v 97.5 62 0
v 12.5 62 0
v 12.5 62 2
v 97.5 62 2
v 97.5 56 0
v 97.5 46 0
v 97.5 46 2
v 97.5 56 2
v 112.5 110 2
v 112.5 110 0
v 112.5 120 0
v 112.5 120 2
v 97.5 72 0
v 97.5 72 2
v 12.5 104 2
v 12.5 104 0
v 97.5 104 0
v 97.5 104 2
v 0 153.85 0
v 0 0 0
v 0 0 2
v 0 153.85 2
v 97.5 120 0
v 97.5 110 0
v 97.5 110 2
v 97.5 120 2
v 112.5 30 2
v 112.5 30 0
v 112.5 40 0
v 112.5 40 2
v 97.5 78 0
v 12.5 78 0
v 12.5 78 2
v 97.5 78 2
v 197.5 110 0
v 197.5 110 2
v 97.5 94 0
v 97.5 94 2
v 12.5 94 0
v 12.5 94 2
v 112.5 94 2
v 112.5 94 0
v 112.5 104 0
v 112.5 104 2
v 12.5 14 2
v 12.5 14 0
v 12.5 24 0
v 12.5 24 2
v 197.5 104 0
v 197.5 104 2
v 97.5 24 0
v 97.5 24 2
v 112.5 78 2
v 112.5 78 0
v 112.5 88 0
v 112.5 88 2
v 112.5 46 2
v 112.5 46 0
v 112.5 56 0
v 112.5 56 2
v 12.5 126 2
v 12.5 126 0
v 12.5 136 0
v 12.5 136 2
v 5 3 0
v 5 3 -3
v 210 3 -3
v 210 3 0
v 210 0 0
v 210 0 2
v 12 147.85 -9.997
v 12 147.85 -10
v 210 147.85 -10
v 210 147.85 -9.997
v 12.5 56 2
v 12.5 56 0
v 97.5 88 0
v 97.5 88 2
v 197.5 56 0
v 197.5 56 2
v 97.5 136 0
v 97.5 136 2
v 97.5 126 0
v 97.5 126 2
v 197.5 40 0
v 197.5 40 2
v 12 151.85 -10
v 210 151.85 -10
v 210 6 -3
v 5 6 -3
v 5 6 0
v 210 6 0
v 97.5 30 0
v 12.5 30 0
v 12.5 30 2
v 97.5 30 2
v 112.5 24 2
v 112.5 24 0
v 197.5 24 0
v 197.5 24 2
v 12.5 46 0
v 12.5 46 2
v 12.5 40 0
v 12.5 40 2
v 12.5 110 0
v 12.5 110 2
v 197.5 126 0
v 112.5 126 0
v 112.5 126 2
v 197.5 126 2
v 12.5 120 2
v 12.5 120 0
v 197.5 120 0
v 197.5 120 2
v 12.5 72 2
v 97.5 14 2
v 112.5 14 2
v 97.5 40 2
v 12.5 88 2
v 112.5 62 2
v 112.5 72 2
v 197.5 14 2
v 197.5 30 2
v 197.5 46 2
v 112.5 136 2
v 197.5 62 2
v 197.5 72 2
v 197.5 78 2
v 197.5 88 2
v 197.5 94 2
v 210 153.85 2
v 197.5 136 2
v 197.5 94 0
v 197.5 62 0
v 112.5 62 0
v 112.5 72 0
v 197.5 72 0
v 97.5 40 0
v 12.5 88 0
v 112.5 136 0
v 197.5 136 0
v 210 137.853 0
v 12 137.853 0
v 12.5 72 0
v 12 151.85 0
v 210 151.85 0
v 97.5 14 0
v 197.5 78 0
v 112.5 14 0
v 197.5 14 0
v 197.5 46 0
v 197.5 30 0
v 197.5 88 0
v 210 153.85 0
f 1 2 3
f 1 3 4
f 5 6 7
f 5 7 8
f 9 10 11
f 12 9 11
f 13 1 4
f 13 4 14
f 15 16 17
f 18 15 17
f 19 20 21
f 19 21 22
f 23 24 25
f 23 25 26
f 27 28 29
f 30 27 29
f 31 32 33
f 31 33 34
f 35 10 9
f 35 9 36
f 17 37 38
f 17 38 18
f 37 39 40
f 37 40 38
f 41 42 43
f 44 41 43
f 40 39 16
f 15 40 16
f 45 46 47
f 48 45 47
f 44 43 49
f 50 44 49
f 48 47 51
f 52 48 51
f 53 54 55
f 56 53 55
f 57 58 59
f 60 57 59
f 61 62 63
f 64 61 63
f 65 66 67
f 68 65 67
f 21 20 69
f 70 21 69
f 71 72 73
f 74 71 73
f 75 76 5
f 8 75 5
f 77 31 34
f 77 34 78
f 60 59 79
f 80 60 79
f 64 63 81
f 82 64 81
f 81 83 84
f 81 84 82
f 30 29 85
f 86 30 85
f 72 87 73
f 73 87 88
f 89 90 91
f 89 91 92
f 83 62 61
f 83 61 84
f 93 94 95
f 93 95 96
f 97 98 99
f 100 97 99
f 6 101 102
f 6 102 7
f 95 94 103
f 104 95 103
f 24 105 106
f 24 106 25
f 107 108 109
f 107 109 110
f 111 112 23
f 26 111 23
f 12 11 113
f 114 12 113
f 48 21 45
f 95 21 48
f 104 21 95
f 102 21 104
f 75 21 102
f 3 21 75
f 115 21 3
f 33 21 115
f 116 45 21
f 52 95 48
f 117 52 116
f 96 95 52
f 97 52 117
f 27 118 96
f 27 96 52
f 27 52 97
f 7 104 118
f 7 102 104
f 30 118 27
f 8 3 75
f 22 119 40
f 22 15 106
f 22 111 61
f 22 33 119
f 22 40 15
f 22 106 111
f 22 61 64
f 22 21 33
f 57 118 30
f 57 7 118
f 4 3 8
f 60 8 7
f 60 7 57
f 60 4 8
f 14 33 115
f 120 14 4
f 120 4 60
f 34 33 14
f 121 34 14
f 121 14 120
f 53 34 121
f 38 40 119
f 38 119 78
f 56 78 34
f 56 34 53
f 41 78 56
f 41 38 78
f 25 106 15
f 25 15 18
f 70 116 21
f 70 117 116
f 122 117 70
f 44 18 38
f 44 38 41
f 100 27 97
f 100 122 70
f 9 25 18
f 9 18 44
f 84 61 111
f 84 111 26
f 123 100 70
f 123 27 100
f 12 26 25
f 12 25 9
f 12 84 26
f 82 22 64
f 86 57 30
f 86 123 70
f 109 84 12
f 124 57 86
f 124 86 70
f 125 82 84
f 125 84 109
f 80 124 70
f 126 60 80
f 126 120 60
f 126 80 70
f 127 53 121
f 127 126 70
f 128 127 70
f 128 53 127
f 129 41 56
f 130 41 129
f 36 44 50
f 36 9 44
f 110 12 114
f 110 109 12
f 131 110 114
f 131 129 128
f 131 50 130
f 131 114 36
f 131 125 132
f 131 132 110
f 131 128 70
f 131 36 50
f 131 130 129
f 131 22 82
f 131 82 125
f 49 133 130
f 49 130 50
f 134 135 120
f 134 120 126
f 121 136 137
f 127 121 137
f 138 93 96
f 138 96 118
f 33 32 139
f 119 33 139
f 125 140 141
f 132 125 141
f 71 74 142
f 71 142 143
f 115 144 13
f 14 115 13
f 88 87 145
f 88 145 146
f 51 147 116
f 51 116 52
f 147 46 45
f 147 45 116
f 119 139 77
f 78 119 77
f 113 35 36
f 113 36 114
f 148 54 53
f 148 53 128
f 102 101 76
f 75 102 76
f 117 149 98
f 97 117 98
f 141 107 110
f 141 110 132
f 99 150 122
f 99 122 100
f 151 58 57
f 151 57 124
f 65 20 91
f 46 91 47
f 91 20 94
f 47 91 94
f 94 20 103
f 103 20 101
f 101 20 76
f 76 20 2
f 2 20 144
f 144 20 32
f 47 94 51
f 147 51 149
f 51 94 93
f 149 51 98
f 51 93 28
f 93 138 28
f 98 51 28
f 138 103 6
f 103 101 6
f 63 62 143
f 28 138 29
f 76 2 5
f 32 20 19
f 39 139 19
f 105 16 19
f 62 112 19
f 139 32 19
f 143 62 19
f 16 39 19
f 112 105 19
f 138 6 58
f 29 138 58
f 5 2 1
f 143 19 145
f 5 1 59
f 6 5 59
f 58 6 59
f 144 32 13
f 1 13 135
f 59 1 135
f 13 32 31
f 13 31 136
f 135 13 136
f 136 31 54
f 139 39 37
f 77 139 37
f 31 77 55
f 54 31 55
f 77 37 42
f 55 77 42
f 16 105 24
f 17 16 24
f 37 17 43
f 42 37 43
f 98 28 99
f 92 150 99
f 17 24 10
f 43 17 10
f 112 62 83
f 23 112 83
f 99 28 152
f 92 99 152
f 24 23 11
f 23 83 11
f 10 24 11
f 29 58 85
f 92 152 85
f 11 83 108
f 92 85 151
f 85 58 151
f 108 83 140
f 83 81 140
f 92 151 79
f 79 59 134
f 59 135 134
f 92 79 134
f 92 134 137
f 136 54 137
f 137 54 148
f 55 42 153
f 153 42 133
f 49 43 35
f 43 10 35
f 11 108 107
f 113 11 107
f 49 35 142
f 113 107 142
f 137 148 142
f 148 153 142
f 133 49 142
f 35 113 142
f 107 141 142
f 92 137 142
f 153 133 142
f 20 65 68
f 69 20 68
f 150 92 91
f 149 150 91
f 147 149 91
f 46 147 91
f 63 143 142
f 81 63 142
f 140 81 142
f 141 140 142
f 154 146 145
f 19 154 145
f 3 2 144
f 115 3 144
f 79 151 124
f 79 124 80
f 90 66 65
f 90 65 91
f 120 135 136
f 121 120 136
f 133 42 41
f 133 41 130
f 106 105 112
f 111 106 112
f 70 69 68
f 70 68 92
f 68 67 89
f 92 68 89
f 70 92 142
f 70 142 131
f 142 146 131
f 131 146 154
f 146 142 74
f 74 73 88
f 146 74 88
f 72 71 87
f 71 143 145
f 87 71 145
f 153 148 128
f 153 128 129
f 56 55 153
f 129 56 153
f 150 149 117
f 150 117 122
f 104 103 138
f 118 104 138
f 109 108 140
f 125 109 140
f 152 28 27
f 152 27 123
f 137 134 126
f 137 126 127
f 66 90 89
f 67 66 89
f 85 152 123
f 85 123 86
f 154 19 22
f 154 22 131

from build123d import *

# Parameters (mm, degrees)
BOX006_W               = 85
BOX006_H               = 10
BOX006_DEPTH           = 10
ARRAY_X_COUNT          = 2
ARRAY_X_PITCH          = 100
ARRAY_Y_COUNT          = 8
ARRAY_Y_PITCH          = 16
BOX004_W               = 220
BOX004_H               = 36
BOX004_DEPTH           = 10
BOX005_W               = 220
BOX005_H               = 10
BOX005_DEPTH           = 27
BOX003_W               = 198
BOX003_H               = 14.14
BOX003_DEPTH           = 14.14
BOX003_ROLL_ANGLE      = 45
CUT001_PLACEMENT_ANGLE = 180
BOX001_W               = 198
BOX001_H               = 4
BOX001_DEPTH           = 10
BOX002_W               = 205
BOX002_H               = 3
BOX002_DEPTH           = 3
BOX_W                  = 210
BOX_H                  = 153.85
BOX_DEPTH              = 2


with BuildPart() as array:
    # Box006 → Box006 (new body)
    with BuildSketch(Plane(origin=(12.5, 14, 0), x_dir=(1, 0, 0), z_dir=(0, 0, 1))):
        with Locations((42.5, 5)):
            Rectangle(BOX006_W, BOX006_H)
    extrude(amount=BOX006_DEPTH)

    # Array X: Array ×2


with BuildPart() as array_1:
    add(array.part)
    with Locations(*[(i * ARRAY_X_PITCH, 0, 0) for i in range(1, ARRAY_X_COUNT)]):
        add(array.part)

    # Array Y: Array ×8


with BuildPart() as array_2:
    add(array_1.part)
    with Locations(*[(0, i * ARRAY_Y_PITCH, 0) for i in range(1, ARRAY_Y_COUNT)]):
        add(array_1.part)


with BuildPart() as array_3:
    # Array placement: moved
    add(array_2.part.moved(Location((0, 0, -4))))


with BuildPart() as cube001:
    # Box004 → Box004 (new body)
    with BuildSketch(Plane(origin=(-6, 76, 40), x_dir=(1, 0, 0), z_dir=(0, 0, 1))):
        with Locations((110, 18)):
            Rectangle(BOX004_W, BOX004_H)
    extrude(amount=BOX004_DEPTH)


with BuildPart() as cube002:
    # Box005 → Box005 (new body)
    with BuildSketch(Plane(origin=(-7, 110, 72), x_dir=(1, 0, 0), z_dir=(0, 0, -1))):
        with Locations((110, 5)):
            Rectangle(BOX005_W, BOX005_H)
    extrude(amount=BOX005_DEPTH)


with BuildPart() as cut001:
    # Box003 → Box003 (new body)
    with BuildSketch(Plane.XY):
        with Locations((99, 7.07)):
            Rectangle(BOX003_W, BOX003_H)
    extrude(amount=BOX003_DEPTH)


with BuildPart() as cut001_1:
    # Box003 roll: moved
    add(cut001.part.rotate(Axis((0, 0, 0), (1, 0, 0)), BOX003_ROLL_ANGLE))


with BuildPart() as cut001_2:
    # Box003 placement: moved
    add(cut001_1.part.moved(Location((0, 100, 40))))

    # Cut: cut Cube002
    add(cube002.part, mode=Mode.SUBTRACT)

    # Cut001: cut Cube001
    add(cube001.part, mode=Mode.SUBTRACT)


with BuildPart() as cut001_3:
    # Cut001 placement: moved
    add(cut001_2.part.moved(Location((210, 51.85, 50))).rotate(Axis((210, 51.85, 50), (0, 1, 0)), CUT001_PLACEMENT_ANGLE))


with BuildPart() as fusion002002:
    # Box001 → Box001 (new body)
    with BuildSketch(Plane(origin=(12, 151.85, -10), x_dir=(1, 0, 0), z_dir=(0, 0, 1))):
        with Locations((99, 2)):
            Rectangle(BOX001_W, BOX001_H)
    extrude(amount=BOX001_DEPTH)

    # Fusion002002: union Cut001
    add(cut001_3.part)


with BuildPart() as fusion002002_1:
    # Fusion002002 placement: moved
    add(fusion002002.part.moved(Location((0, -4, 0))))


with BuildPart() as fleje_abajo:
    # Box002 → Box002 (new body)
    with BuildSketch(Plane(origin=(5, 3, -3), x_dir=(1, 0, 0), z_dir=(0, 0, 1))):
        with Locations((102.5, 1.5)):
            Rectangle(BOX002_W, BOX002_H)
    extrude(amount=BOX002_DEPTH)


with BuildPart() as cut002:
    # Box → Box (new body)
    with BuildSketch(Plane.XY):
        with Locations((105, 76.925)):
            Rectangle(BOX_W, BOX_H)
    extrude(amount=BOX_DEPTH)

    # Fusion: union fleje abajo
    add(fleje_abajo.part)

    # Fusion002003: union Fusion002002
    add(fusion002002_1.part)

    # Cut002: cut Array
    add(array_3.part, mode=Mode.SUBTRACT)


solid = cut002.part
